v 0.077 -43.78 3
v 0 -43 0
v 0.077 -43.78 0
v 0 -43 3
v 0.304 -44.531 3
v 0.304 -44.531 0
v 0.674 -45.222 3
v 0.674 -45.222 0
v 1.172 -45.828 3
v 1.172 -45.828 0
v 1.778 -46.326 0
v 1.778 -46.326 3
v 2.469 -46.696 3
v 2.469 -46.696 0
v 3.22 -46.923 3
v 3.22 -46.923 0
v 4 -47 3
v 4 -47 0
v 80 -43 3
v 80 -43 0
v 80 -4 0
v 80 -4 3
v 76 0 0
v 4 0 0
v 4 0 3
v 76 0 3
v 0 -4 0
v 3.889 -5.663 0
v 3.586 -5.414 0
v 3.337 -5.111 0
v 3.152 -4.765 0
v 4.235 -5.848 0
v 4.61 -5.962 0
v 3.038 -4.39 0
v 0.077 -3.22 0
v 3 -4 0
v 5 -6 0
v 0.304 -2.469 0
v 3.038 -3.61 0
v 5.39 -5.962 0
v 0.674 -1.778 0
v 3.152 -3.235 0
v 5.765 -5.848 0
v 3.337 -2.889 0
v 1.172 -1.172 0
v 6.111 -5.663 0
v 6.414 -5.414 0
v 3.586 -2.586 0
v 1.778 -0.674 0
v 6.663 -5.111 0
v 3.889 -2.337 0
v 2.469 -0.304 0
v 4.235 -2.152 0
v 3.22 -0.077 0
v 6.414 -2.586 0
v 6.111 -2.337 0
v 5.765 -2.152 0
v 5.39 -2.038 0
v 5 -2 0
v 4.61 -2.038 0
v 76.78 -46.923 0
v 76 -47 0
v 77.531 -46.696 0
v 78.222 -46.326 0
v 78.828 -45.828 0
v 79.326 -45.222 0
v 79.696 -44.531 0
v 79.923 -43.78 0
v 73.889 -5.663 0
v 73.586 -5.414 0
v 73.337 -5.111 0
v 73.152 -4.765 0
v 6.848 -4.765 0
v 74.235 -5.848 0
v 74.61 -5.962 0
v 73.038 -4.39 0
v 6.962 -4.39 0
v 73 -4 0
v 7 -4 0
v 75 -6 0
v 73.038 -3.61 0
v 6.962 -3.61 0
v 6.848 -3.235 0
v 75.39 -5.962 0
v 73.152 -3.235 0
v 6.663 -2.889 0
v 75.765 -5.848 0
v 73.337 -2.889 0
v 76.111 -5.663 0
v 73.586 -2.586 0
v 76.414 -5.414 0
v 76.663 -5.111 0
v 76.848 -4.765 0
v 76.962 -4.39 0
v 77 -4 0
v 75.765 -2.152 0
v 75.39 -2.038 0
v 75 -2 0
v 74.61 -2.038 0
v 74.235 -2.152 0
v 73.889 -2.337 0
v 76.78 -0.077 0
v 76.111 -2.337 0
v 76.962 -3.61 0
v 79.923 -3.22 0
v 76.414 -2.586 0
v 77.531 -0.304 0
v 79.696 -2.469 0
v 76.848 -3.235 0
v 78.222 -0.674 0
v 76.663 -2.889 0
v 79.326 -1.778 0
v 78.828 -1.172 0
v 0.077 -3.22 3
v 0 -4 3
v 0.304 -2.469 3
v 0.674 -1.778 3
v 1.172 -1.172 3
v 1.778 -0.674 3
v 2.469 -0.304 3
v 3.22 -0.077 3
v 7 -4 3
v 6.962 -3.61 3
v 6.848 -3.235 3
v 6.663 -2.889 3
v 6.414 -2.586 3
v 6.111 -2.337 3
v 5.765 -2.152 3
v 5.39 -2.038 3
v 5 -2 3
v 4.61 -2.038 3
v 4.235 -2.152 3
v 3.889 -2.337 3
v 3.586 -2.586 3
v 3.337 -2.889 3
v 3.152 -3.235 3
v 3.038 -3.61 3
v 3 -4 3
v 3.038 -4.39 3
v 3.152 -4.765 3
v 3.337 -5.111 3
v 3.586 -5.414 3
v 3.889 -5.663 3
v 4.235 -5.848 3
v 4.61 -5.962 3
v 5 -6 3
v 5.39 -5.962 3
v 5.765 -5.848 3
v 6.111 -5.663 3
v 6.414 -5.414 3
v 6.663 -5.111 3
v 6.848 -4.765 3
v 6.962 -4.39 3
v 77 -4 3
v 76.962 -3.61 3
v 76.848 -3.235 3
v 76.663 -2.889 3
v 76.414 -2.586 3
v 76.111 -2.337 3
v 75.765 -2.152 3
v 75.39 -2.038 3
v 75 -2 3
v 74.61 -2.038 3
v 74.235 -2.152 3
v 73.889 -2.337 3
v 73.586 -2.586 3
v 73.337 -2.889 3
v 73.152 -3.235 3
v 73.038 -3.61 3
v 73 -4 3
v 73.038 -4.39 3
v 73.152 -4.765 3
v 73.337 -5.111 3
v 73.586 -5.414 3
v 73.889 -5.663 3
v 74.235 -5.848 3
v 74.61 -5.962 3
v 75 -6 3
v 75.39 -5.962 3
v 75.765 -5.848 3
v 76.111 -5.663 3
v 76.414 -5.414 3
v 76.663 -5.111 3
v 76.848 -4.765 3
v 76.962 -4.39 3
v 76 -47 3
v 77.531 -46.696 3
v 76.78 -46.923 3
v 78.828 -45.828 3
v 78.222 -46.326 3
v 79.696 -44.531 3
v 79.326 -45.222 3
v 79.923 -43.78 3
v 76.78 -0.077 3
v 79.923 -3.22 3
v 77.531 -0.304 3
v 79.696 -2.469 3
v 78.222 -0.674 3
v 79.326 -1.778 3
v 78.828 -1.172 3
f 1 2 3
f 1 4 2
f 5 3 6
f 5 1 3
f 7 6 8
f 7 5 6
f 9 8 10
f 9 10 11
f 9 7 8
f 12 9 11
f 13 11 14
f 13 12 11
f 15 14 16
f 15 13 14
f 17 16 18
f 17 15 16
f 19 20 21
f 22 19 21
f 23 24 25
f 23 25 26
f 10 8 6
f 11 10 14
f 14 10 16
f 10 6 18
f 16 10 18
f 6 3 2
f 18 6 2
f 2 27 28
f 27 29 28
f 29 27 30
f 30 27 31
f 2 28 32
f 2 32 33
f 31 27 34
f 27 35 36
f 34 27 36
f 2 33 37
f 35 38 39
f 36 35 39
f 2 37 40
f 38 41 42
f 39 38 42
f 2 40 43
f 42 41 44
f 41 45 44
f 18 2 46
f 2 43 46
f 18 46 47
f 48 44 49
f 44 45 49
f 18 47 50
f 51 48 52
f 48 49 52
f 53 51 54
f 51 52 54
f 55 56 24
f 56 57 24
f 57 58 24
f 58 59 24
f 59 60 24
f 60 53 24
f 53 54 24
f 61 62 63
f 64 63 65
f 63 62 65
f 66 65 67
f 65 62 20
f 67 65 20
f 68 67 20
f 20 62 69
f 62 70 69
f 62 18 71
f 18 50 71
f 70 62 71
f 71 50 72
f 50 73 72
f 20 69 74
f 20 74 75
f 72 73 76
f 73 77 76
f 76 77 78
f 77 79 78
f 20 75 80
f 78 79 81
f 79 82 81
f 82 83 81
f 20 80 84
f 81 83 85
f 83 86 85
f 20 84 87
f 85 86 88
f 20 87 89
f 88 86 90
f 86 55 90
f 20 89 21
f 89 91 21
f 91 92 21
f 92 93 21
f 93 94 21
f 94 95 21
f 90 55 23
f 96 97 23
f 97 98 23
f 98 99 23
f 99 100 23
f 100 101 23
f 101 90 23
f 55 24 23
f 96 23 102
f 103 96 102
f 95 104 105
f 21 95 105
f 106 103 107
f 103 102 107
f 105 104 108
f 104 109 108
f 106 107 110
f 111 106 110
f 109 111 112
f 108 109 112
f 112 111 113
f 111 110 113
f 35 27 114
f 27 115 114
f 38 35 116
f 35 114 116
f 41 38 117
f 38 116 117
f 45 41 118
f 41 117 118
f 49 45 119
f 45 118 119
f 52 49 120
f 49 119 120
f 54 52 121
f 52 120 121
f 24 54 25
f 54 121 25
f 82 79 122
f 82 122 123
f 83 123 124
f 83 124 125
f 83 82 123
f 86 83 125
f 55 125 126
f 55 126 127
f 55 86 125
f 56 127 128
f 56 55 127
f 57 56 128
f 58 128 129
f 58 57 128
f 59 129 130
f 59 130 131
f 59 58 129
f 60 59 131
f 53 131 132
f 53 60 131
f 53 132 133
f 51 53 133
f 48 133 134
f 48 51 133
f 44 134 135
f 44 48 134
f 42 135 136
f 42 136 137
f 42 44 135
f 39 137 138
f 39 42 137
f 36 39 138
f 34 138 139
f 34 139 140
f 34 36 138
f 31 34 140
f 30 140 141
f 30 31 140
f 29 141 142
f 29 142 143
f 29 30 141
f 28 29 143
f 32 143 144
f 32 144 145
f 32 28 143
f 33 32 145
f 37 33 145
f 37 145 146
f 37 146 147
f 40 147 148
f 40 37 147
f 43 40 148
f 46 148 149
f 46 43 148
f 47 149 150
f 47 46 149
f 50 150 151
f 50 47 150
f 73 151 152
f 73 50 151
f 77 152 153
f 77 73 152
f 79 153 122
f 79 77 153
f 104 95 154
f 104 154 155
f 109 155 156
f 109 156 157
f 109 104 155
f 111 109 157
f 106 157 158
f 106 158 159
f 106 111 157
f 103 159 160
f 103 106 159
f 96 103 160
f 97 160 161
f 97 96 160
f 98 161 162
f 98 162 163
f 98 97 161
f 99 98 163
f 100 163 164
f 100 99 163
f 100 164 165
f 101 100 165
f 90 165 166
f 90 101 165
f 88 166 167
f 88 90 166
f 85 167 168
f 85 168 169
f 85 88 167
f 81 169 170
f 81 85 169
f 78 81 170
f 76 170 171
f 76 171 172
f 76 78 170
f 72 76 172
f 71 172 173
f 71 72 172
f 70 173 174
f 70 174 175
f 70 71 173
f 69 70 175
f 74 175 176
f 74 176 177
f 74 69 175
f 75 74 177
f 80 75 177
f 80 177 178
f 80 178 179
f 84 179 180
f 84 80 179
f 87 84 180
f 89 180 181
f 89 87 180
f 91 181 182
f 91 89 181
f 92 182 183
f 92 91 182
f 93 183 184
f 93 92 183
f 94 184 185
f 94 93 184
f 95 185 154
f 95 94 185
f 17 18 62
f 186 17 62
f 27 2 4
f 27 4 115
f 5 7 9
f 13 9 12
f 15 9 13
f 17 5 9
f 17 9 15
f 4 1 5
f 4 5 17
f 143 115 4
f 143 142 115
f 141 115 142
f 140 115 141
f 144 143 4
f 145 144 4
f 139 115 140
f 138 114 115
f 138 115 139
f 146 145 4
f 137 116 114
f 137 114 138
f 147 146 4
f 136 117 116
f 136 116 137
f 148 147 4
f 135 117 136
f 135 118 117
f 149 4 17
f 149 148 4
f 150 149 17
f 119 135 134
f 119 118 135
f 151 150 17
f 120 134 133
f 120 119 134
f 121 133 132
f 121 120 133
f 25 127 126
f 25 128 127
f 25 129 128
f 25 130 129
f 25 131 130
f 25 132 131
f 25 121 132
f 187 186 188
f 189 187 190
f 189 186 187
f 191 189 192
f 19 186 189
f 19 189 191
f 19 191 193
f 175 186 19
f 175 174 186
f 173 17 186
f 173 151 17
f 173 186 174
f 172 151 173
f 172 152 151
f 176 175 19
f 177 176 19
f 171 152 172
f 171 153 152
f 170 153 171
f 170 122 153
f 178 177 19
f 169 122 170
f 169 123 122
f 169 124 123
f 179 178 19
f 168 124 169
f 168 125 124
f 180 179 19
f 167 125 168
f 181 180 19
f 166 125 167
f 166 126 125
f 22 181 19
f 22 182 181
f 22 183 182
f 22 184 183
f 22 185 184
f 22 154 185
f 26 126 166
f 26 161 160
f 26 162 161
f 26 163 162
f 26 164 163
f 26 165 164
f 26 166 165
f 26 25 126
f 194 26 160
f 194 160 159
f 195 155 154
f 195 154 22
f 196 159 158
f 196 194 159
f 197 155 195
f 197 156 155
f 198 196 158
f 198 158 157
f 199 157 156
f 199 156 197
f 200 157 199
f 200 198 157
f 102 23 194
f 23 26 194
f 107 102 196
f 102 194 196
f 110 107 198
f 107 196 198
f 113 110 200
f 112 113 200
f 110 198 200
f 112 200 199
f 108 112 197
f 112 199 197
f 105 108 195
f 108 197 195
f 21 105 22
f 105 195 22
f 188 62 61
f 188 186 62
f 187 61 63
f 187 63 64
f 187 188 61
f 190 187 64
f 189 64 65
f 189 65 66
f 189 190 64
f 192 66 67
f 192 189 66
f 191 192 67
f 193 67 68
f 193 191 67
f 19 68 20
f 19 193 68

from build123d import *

# Parameters (mm, degrees)
ESQUISSE1_W        = 80
ESQUISSE1_H        = 47
ESQUISSE1_R        = 2
BOSS_EXTRU_1_DEPTH = 3
CONG_1_R           = 4


with BuildPart() as part:
    # Esquisse1 → Boss.-Extru.1 (new body)
    with BuildSketch(Plane.XY):
        with Locations((40, -23.5)):
            Rectangle(ESQUISSE1_W, ESQUISSE1_H)
        with Locations((5, -4)):
            Circle(ESQUISSE1_R, mode=Mode.SUBTRACT)
        with Locations((75, -4)):
            Circle(ESQUISSE1_R, mode=Mode.SUBTRACT)
    extrude(amount=BOSS_EXTRU_1_DEPTH)

    # Congé1
    cong_1_edges = [part.edges().sort_by_distance(p)[0] for p in [
        (0, 0, 1.5),
        (80, 0, 1.5),
        (80, -47, 1.5),
        (0, -47, 1.5),
    ]]
    fillet(cong_1_edges, radius=CONG_1_R)


solid = part.part
